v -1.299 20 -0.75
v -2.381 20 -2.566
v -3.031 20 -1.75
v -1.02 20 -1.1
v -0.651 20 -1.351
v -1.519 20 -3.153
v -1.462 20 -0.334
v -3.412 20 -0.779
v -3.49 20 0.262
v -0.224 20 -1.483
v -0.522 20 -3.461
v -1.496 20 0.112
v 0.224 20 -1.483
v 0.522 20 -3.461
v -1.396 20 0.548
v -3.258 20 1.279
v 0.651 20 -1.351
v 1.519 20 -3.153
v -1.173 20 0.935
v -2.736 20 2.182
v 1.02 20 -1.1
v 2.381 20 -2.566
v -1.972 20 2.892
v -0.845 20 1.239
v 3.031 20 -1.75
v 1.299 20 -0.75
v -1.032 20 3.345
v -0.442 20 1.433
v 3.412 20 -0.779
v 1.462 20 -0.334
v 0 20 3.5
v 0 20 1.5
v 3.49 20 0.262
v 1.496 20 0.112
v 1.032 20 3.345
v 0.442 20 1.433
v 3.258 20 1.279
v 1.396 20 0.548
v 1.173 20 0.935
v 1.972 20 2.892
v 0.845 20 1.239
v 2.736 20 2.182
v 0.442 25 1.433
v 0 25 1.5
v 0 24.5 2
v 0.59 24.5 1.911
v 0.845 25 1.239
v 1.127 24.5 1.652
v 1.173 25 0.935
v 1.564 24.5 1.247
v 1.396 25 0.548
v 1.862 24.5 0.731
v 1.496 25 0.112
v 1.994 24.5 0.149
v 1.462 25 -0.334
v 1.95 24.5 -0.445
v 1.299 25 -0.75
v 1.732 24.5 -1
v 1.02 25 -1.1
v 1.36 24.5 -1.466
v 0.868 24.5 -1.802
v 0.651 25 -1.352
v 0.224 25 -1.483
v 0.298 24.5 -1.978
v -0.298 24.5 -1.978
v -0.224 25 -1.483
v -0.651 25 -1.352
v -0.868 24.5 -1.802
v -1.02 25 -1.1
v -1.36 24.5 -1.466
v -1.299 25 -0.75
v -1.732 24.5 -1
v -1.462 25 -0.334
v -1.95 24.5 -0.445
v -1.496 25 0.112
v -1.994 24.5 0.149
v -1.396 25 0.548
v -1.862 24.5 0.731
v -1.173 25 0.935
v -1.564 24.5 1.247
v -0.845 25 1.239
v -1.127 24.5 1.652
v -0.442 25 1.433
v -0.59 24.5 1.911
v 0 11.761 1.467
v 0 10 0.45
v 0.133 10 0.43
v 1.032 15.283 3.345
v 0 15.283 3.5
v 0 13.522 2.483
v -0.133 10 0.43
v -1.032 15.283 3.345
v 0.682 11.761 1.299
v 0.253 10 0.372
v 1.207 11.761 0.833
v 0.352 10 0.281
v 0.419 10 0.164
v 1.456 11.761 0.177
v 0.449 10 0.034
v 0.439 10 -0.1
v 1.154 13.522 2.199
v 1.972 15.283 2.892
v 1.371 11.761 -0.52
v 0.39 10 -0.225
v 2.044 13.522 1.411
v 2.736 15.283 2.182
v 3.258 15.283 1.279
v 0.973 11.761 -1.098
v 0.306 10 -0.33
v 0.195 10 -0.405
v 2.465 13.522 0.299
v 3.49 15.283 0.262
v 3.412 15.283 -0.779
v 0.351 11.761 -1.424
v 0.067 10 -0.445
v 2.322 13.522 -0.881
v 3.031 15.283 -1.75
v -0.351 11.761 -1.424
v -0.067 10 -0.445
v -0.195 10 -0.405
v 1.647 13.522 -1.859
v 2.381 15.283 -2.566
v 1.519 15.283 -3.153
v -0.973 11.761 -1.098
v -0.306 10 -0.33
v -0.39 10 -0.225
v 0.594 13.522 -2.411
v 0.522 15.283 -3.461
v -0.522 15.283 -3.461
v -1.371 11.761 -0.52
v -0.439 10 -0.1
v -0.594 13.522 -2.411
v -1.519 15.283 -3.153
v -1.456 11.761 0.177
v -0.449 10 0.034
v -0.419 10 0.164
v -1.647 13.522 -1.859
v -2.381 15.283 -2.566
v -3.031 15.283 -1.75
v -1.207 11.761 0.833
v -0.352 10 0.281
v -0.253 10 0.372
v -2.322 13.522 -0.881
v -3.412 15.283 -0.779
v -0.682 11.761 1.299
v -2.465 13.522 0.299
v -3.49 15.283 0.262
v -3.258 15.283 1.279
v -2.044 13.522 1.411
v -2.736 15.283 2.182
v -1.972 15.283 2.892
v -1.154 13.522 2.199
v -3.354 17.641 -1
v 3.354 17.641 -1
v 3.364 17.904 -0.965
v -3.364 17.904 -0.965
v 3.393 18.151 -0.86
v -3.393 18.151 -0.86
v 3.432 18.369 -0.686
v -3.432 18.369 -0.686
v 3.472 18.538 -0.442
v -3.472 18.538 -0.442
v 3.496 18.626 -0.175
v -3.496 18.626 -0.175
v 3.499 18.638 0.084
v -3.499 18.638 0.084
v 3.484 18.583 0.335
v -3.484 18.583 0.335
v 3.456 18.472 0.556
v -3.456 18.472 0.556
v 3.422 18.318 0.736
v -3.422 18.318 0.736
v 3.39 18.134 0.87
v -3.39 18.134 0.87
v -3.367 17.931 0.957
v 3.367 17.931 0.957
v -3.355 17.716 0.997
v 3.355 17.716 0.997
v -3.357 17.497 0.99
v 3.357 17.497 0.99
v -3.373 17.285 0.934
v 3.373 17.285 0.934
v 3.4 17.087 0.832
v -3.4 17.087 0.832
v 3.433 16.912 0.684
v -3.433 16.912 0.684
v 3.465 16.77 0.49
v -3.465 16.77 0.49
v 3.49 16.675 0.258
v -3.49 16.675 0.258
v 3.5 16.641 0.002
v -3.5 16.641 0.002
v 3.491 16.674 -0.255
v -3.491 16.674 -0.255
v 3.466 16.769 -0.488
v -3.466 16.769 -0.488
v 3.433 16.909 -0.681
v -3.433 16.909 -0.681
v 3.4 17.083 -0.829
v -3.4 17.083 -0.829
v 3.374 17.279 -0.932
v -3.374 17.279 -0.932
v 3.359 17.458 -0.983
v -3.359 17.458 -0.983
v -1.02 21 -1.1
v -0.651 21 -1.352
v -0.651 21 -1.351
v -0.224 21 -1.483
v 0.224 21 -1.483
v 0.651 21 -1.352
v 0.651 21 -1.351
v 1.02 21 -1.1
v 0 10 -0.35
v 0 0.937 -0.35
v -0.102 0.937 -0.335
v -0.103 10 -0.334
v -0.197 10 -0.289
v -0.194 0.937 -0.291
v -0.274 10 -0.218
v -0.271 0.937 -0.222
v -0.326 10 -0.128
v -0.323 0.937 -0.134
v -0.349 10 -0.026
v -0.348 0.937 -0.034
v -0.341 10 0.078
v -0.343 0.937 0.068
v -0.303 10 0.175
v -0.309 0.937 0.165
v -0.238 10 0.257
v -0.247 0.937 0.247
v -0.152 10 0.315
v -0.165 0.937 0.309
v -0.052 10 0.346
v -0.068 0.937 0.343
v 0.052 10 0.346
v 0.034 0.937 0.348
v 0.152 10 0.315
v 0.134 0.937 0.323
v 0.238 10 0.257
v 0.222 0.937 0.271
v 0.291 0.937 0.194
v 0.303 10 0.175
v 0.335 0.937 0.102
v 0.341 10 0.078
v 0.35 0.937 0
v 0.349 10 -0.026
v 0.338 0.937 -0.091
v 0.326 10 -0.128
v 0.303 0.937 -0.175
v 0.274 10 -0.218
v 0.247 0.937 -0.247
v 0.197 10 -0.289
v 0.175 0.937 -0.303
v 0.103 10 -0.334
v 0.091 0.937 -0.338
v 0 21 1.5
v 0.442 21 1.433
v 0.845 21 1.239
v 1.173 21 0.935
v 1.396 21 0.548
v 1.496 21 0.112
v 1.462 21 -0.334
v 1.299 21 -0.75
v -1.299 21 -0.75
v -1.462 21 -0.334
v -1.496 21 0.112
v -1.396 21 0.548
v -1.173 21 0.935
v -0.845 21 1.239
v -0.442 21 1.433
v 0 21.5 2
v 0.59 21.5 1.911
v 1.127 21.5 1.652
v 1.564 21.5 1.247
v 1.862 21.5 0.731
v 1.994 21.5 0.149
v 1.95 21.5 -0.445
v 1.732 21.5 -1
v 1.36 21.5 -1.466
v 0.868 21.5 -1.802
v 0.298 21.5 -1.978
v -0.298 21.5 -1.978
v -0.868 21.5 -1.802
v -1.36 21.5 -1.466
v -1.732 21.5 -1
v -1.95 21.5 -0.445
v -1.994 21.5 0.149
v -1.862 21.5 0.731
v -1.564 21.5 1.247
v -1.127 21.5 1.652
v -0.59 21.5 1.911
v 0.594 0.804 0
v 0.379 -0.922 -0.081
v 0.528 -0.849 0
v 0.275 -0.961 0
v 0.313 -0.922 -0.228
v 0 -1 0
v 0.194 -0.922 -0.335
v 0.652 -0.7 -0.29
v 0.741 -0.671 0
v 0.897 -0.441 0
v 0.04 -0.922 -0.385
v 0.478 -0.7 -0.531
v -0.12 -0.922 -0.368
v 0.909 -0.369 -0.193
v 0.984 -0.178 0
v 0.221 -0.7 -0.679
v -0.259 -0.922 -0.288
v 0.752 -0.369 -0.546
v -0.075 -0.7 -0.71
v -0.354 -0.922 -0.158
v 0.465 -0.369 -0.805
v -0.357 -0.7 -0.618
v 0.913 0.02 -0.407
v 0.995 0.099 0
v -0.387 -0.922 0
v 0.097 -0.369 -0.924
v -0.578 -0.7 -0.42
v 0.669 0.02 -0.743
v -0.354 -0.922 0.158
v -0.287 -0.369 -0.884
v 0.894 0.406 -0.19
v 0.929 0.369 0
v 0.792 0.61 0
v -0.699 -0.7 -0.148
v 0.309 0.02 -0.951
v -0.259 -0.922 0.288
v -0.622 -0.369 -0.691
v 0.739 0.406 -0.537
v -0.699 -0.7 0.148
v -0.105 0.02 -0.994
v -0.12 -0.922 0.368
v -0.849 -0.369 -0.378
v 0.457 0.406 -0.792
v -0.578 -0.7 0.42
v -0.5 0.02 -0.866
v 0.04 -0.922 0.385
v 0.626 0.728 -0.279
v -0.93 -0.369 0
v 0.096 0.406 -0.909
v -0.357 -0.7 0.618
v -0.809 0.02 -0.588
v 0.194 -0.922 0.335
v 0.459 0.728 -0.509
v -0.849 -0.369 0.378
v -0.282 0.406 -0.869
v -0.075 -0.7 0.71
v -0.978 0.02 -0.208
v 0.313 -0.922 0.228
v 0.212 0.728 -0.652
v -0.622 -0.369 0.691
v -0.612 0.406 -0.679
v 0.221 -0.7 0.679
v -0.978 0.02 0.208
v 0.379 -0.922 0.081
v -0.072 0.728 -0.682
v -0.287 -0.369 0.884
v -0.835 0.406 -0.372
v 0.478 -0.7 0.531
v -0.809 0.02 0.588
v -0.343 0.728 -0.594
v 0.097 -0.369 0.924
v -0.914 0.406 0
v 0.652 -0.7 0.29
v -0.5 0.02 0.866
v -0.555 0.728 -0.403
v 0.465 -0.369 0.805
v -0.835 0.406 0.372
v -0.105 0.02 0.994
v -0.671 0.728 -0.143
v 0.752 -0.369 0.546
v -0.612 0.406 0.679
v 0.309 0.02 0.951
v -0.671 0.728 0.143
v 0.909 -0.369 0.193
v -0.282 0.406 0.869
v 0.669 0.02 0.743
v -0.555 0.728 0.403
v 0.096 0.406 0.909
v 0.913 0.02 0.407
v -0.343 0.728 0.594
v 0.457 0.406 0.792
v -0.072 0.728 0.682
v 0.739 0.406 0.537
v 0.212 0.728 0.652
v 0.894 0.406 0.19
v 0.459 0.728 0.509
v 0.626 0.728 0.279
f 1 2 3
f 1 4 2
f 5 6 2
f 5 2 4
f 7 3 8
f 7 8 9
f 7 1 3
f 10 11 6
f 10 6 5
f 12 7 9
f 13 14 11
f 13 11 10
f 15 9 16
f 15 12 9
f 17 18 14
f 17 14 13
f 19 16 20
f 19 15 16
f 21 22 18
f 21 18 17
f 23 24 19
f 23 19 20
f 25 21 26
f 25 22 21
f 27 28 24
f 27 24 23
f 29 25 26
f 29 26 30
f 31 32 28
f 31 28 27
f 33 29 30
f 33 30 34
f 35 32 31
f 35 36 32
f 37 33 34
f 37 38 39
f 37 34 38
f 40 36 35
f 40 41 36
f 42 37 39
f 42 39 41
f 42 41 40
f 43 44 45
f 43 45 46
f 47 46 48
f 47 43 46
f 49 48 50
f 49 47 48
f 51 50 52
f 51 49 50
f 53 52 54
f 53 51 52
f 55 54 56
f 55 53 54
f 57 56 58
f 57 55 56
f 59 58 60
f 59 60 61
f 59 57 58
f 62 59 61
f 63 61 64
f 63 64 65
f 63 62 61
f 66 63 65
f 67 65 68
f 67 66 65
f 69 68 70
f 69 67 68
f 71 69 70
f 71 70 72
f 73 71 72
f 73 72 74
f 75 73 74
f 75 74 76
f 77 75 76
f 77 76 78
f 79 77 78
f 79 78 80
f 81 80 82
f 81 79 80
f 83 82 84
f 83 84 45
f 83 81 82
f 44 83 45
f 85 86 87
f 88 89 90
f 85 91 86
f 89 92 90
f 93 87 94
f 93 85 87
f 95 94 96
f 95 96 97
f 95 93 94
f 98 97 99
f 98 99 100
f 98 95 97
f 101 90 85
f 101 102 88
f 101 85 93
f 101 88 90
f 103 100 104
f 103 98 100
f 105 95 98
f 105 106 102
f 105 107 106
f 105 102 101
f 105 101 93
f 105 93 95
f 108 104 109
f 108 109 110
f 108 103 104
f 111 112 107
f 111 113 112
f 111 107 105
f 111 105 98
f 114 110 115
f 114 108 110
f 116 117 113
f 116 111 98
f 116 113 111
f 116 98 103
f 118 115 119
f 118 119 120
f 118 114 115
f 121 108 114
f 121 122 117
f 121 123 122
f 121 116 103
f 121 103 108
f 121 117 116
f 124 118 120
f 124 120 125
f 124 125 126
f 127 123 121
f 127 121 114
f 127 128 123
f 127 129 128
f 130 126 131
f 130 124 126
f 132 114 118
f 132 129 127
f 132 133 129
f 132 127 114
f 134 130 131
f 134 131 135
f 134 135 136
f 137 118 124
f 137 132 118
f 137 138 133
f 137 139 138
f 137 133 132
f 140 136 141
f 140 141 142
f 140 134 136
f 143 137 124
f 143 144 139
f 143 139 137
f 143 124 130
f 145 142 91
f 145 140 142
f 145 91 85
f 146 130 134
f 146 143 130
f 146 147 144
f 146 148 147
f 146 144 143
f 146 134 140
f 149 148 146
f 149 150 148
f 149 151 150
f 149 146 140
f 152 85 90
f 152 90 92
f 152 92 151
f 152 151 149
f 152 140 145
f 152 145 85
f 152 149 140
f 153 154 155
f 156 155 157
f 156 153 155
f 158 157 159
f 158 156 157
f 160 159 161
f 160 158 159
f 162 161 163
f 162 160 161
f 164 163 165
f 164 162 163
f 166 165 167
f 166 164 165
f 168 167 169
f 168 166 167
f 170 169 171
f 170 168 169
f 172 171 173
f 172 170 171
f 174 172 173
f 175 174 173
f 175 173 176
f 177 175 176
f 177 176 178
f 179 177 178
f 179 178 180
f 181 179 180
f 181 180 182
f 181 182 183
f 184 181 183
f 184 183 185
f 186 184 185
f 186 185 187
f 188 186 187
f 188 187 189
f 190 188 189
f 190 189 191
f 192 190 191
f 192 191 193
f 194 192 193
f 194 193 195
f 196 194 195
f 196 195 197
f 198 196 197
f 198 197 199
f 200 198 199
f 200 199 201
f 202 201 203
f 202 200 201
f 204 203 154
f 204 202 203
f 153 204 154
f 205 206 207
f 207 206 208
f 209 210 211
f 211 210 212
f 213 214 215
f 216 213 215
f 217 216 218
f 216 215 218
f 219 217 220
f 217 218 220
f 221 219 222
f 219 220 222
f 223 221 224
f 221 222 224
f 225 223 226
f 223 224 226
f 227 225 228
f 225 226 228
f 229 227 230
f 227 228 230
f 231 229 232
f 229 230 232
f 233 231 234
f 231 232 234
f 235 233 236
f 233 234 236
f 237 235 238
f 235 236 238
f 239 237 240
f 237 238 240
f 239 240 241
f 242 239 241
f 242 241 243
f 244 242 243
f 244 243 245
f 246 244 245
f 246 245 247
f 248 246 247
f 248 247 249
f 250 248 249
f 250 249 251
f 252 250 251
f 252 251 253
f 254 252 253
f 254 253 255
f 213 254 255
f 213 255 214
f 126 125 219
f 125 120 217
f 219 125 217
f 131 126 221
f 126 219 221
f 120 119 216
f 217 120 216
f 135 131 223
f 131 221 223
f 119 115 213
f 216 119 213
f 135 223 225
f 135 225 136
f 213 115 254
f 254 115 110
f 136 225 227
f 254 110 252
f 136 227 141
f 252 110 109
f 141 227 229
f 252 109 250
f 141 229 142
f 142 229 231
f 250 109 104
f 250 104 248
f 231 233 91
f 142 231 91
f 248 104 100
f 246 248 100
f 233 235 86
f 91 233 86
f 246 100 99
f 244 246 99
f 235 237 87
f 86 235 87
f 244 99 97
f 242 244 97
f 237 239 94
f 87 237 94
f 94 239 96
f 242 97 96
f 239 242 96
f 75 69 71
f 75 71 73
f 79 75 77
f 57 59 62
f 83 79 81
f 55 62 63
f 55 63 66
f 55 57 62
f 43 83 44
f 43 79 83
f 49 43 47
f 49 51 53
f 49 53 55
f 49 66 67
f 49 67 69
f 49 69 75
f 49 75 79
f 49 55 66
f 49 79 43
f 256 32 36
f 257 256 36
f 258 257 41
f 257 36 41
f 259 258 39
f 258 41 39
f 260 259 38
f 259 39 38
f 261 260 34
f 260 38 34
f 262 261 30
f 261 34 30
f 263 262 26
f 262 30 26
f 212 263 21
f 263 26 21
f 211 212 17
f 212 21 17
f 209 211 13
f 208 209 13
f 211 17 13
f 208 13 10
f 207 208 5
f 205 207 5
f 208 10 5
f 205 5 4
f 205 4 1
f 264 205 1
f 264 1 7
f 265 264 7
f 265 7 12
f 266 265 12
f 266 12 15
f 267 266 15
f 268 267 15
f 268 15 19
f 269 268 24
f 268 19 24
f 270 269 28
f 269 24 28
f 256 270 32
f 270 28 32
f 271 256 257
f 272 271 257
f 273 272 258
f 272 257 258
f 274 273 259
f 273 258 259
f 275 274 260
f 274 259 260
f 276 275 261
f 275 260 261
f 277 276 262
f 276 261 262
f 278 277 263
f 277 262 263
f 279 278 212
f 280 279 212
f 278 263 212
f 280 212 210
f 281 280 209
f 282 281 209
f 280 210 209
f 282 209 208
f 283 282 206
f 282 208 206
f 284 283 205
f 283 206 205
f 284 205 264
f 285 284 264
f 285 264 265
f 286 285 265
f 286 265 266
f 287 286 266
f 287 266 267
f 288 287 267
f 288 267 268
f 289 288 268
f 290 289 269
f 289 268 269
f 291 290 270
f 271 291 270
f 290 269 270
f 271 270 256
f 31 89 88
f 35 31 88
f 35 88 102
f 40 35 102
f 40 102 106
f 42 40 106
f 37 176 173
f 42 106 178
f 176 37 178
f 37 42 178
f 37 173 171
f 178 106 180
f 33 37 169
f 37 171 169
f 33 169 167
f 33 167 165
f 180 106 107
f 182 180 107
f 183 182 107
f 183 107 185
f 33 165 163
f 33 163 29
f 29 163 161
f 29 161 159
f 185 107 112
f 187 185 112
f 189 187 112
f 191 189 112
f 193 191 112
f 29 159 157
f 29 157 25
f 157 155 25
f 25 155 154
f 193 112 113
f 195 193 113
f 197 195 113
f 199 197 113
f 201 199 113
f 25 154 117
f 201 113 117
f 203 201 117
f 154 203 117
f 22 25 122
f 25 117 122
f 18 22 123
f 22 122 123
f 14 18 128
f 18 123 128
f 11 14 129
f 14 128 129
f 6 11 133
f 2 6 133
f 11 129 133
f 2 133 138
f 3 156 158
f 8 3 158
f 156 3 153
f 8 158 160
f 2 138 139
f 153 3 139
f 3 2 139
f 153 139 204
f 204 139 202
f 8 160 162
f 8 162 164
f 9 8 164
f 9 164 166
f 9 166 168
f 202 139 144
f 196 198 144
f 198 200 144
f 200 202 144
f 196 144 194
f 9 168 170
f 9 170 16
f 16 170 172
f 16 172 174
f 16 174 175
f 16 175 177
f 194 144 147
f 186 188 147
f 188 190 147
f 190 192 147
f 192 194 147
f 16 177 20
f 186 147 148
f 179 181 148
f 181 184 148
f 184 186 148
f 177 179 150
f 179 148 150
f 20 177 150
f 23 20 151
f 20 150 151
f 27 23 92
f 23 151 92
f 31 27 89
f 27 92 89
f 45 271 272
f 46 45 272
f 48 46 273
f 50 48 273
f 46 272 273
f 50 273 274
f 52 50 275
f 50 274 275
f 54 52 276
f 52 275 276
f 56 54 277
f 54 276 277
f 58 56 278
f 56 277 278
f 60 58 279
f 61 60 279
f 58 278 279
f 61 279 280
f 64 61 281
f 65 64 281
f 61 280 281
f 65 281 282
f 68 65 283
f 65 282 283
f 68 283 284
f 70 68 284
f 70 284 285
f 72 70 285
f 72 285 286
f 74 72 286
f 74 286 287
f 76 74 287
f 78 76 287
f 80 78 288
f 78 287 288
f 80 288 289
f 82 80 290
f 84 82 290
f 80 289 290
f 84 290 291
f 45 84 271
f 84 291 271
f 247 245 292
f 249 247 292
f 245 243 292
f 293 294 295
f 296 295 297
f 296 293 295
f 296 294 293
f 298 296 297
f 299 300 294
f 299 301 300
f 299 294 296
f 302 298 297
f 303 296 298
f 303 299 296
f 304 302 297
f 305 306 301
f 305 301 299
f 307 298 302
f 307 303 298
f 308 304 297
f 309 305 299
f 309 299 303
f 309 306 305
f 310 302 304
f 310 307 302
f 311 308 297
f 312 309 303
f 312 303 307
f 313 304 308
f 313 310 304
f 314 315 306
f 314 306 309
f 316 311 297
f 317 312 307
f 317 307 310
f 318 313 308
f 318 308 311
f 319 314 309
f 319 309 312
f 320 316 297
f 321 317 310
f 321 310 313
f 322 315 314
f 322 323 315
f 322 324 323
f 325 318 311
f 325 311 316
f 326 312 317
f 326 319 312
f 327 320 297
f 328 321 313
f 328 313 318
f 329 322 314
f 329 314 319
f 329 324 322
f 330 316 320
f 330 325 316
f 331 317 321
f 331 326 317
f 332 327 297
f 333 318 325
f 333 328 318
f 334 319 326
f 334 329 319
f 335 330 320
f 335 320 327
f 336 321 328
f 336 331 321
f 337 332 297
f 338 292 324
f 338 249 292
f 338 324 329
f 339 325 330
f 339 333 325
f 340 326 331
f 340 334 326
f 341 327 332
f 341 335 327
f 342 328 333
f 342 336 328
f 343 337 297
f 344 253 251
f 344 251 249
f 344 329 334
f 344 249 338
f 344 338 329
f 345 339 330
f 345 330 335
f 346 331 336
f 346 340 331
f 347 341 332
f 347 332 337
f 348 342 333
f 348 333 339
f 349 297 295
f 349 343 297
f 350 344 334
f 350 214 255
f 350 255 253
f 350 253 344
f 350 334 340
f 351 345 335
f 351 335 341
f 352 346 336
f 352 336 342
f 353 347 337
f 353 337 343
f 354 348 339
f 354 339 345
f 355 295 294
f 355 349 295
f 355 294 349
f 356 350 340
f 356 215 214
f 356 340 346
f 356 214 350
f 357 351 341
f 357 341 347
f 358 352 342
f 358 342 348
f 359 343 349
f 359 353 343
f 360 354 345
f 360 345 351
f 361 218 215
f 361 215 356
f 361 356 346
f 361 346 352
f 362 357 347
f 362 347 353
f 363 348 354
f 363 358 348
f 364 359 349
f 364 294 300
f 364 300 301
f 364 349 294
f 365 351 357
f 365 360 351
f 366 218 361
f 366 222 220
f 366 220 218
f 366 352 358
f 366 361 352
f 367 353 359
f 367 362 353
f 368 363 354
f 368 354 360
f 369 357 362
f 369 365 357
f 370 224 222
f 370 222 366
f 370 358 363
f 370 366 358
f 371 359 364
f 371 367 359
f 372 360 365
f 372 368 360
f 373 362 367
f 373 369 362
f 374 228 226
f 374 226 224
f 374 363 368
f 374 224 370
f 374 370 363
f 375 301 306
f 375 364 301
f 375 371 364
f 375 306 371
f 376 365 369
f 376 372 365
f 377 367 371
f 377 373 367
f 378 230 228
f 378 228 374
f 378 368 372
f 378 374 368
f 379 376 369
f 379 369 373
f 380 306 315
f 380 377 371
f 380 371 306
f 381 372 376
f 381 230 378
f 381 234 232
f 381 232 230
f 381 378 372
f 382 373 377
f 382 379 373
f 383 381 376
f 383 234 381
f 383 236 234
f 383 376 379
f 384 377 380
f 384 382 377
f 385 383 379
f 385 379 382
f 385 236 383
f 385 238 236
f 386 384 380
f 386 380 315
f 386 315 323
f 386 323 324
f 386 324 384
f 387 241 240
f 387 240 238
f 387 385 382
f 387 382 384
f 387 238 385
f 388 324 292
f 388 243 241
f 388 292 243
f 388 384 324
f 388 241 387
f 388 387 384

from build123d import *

# Parameters (mm, degrees)
SKETCH2_R               = 0.35
BOSS_EXTRUDE2_DEPTH     = 10
SKETCH4_R               = 3.5
BOSS_EXTRUDE3_DEPTH     = 10
CHAMFER1_SIZE           = 3.05
CHAMFER1_SIZE2          = 5.282754963
CUT_EXTRUDE4_DEPTH      = 21.603397778
CUT_EXTRUDE4_DEPTH_BACK = 21.603397778
SKETCH5_R               = 1
SKETCH6_R               = 1.5
BOSS_EXTRUDE4_DEPTH     = 1
SKETCH7_R               = 2
BOSS_EXTRUDE5_DEPTH     = 4
CHAMFER2_SIZE           = 0.5


with BuildPart() as part:
    # Sketch1 → Revolve1 (revolve)
    with BuildSketch(Plane.XY):
        with BuildLine():
            Line((0, 0), (0, -1))
            ThreePointArc((0, -1), (1, 0), (0, 1))
            Line((0, 1), (0, 0))
        make_face()
    revolve(axis=Axis((0, 0, 0), (0, 1, 0)))

    # Sketch2 → Boss-Extrude2 (add)
    with BuildSketch(Plane(origin=(0, 0, 0), x_dir=(1, 0, 0), z_dir=(0, 1, 0))):
        with Locations(Location((0, 0, 0), (0, 0, 90))):
            Circle(SKETCH2_R)
    extrude(amount=BOSS_EXTRUDE2_DEPTH)

    # Sketch4 → Boss-Extrude3 (add)
    with BuildSketch(Plane(origin=(0, 10, 0), x_dir=(1, 0, 0), z_dir=(0, 1, 0))):
        with Locations(Location((0, 0, 0), (0, 0, 270))):
            Circle(SKETCH4_R)
    extrude(amount=BOSS_EXTRUDE3_DEPTH)

    # Chamfer1
    chamfer1_edges = [part.edges().sort_by_distance(p)[0] for p in [
        (0, 10, -3.5),
    ]]
    chamfer1_side = [part.faces().sort_by_distance(p)[0] for p in [
        (0, 10, -3.401005051),
    ]]
    chamfer(chamfer1_edges, length=CHAMFER1_SIZE, length2=CHAMFER1_SIZE2, reference=chamfer1_side[0])

    # Sketch5 → Cut-Extrude4 (cut, two sides: drawn at the far end of the back side and taken through both)
    with BuildSketch(Plane(origin=(0, 0, 0), x_dir=(0, 0, -1), z_dir=(1, 0, 0)).offset(-CUT_EXTRUDE4_DEPTH_BACK)):
        with Locations((0, 17.641377482)):
            Circle(SKETCH5_R)
    extrude(amount=CUT_EXTRUDE4_DEPTH + CUT_EXTRUDE4_DEPTH_BACK, mode=Mode.SUBTRACT)

    # Sketch6 → Boss-Extrude4 (add)
    with BuildSketch(Plane(origin=(0, 20, 0), x_dir=(1, 0, 0), z_dir=(0, 1, 0))):
        with Locations(Location((0, 0, 0), (0, 0, 270))):
            Circle(SKETCH6_R)
    extrude(amount=BOSS_EXTRUDE4_DEPTH)

    # Sketch7 → Boss-Extrude5 (add)
    with BuildSketch(Plane(origin=(0, 21, 0), x_dir=(1, 0, 0), z_dir=(0, 1, 0))):
        with Locations(Location((0, 0, 0), (0, 0, 270))):
            Circle(SKETCH7_R)
    extrude(amount=BOSS_EXTRUDE5_DEPTH)

    # Chamfer2
    chamfer2_edges = [part.edges().sort_by_distance(p)[0] for p in [
        (0, 21, -2),
        (0, 25, -2),
    ]]
    chamfer(chamfer2_edges, length=CHAMFER2_SIZE - 0.0001)  # a hair under: the kernel refuses the full size


solid = part.part
